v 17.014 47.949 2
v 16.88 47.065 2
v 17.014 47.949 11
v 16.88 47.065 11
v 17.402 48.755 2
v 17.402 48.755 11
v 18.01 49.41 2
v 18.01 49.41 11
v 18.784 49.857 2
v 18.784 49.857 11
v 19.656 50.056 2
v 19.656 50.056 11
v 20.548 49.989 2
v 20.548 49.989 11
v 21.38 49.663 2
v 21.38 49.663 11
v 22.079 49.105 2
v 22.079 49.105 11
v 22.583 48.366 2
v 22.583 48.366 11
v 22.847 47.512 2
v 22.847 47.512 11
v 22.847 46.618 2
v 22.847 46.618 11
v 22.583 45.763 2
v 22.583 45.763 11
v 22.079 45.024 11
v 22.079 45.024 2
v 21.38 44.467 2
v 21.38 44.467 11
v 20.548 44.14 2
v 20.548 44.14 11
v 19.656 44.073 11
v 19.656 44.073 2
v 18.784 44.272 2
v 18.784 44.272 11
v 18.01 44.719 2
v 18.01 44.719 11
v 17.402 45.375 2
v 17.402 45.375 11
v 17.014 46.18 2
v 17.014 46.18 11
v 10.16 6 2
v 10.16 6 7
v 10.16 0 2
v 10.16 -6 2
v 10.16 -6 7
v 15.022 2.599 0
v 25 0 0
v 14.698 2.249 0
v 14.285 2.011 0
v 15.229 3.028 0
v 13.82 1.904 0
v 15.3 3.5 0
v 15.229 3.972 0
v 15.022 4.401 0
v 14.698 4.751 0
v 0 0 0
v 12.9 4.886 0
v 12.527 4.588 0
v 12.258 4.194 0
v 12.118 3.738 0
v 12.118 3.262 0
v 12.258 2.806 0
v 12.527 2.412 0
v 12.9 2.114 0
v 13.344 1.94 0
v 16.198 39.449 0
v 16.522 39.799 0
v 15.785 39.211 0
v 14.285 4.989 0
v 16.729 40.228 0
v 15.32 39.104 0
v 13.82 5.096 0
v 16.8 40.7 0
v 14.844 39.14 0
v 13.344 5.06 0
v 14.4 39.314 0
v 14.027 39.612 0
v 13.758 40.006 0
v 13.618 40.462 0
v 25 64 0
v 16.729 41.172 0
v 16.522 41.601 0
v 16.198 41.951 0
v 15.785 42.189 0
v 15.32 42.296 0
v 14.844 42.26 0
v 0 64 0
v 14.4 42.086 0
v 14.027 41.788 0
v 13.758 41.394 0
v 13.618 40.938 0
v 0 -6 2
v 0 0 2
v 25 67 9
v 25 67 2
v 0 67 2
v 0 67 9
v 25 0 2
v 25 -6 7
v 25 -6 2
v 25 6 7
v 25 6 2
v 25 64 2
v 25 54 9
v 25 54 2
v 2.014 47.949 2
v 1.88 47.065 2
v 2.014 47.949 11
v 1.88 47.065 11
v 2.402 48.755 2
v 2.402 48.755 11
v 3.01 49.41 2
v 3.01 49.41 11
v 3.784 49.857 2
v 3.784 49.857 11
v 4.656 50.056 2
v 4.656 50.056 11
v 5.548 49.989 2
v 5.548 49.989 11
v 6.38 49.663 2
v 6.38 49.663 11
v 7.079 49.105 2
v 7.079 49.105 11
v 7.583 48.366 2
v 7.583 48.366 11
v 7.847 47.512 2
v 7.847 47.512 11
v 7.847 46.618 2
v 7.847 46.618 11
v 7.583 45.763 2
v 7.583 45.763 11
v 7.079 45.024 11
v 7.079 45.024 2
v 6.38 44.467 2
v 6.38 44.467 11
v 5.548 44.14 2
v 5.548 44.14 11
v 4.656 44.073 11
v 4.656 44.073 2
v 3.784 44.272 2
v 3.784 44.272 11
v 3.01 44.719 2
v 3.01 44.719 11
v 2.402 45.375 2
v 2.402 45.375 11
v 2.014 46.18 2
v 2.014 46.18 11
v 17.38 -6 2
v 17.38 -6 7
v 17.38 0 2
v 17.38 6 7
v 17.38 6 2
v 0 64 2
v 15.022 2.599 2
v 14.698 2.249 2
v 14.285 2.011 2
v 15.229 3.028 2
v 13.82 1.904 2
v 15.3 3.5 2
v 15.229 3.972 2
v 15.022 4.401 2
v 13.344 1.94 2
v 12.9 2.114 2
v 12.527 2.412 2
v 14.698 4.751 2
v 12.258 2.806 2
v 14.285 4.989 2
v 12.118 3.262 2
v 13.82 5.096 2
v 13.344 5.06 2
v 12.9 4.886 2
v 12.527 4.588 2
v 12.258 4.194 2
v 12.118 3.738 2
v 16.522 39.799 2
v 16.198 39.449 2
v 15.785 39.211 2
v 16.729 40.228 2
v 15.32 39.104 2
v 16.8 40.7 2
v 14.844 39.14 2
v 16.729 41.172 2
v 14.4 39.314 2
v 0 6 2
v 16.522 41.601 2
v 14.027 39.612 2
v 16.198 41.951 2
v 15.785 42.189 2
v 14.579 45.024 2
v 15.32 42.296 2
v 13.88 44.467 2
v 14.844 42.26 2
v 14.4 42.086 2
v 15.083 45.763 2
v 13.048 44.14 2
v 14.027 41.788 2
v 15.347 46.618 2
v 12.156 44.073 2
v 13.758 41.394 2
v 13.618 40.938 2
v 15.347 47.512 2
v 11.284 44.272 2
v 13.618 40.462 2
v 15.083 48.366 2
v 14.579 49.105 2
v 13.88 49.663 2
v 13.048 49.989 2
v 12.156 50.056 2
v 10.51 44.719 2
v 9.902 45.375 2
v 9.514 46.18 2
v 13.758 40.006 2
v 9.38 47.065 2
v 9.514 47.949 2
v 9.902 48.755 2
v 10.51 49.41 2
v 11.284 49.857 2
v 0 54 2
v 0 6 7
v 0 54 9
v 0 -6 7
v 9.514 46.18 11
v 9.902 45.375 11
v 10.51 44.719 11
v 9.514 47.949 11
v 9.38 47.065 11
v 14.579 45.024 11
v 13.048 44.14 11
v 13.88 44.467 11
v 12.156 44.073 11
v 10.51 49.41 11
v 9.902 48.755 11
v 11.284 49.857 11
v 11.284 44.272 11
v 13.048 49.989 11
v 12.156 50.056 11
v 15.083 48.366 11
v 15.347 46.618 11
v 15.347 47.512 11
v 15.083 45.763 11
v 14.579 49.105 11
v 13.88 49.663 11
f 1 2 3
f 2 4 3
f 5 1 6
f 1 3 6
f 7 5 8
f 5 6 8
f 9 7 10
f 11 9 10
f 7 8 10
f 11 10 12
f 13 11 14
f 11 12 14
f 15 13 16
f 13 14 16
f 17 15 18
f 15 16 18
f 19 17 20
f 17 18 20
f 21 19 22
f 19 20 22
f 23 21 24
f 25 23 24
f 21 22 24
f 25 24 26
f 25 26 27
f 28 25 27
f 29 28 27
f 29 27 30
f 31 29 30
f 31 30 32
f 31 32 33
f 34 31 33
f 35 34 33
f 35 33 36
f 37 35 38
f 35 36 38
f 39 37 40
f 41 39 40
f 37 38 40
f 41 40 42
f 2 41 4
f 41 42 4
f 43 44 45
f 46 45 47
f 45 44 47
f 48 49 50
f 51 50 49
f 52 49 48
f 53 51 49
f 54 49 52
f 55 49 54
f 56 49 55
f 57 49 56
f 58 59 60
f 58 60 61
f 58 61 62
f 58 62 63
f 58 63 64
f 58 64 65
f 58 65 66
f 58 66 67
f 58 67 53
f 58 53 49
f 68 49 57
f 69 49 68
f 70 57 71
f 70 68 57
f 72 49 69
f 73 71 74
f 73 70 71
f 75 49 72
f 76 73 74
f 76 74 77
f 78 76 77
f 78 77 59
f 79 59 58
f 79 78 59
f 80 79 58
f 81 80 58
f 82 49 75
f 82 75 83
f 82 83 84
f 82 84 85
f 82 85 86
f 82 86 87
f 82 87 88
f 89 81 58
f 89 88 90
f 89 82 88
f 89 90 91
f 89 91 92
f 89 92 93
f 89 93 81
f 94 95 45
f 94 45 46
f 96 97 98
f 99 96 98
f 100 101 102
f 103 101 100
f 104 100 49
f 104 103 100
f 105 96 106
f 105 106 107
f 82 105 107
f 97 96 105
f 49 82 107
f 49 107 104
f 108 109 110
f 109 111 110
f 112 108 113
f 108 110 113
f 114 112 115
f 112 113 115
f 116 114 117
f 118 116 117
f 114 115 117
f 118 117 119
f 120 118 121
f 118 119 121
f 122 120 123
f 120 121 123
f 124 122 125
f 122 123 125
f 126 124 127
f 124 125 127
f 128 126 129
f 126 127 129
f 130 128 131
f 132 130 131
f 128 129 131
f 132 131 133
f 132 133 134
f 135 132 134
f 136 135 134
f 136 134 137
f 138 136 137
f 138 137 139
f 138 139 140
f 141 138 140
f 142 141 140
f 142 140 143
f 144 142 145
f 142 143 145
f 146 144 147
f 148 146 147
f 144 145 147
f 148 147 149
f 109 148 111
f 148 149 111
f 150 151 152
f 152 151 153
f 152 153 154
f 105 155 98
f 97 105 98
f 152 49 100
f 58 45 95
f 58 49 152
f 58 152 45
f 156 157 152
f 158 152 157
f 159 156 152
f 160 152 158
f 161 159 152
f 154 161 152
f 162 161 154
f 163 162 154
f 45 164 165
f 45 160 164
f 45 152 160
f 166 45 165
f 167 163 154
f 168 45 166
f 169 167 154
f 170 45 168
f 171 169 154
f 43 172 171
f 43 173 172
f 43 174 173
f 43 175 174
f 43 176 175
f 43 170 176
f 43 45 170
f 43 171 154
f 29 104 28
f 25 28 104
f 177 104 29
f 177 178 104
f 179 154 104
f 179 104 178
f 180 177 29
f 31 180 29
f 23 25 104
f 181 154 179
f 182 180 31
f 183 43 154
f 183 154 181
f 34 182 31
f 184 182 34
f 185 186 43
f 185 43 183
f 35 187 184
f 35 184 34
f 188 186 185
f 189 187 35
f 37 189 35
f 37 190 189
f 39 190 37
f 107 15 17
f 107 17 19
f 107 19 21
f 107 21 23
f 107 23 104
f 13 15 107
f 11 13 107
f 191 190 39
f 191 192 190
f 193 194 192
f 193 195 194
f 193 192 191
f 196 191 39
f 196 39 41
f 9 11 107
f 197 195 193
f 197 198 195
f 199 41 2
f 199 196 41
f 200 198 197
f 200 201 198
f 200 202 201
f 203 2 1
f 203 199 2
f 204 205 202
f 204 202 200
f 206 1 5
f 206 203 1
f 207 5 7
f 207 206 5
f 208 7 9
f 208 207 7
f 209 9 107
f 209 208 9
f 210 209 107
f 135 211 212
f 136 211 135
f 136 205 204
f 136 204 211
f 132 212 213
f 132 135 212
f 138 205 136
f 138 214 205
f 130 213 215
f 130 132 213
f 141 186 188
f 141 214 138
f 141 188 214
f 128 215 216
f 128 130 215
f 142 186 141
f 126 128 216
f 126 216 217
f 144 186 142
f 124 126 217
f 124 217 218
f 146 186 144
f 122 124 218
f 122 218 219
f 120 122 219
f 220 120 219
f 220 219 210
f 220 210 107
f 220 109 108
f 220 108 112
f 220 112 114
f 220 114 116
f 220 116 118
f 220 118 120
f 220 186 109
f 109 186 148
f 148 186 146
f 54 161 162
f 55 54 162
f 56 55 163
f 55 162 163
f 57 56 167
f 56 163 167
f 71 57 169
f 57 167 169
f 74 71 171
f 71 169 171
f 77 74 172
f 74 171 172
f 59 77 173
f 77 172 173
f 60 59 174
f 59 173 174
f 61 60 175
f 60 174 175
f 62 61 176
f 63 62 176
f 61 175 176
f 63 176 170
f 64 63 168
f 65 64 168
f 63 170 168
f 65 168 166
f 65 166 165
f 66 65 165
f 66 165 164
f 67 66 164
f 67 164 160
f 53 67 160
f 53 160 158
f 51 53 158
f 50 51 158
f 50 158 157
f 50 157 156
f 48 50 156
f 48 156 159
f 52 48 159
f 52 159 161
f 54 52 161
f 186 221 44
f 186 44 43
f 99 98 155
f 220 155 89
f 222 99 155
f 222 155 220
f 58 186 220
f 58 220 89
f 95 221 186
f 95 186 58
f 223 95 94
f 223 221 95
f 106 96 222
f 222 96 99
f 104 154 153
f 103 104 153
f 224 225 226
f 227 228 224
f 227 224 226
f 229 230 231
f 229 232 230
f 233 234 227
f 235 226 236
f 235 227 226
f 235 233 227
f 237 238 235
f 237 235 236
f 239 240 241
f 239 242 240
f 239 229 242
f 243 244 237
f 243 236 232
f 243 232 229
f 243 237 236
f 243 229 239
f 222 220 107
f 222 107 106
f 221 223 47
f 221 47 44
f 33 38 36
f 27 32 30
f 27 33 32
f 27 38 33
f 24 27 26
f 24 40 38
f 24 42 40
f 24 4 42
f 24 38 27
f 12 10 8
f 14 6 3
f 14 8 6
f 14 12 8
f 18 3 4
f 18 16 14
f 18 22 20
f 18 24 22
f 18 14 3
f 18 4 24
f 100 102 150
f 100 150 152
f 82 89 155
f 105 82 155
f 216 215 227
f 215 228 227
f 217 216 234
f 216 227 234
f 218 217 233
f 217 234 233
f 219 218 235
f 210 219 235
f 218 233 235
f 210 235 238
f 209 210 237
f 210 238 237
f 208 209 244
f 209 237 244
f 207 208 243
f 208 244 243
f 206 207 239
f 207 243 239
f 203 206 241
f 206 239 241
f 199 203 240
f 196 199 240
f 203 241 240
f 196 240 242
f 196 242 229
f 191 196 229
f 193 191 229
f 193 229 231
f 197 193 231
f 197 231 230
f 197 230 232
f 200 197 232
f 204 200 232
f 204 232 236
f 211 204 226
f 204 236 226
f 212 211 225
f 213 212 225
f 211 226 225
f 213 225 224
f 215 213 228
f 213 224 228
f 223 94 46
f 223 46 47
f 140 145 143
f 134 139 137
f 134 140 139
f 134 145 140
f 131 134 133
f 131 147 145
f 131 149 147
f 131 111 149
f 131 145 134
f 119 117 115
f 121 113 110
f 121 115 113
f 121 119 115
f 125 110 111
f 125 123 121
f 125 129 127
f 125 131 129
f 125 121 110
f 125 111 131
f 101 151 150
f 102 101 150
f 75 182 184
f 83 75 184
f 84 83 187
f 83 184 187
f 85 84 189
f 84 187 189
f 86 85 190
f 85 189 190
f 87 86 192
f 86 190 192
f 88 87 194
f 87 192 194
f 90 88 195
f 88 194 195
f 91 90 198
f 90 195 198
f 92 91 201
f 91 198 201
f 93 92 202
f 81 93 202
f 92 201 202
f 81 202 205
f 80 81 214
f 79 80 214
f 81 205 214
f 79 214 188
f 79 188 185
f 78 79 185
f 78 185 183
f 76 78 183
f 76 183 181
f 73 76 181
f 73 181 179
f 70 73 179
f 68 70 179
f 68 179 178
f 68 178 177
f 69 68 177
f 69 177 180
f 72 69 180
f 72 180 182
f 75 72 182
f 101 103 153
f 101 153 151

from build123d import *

# Parameters (mm, degrees)
SKETCH1_W                      = 25
SKETCH1_H                      = 67
BOSS_EXTRUDE1_DEPTH            = 9
SKETCH2_W                      = 2
SKETCH2_H                      = 3
CUT_EXTRUDE1_DEPTH             = 73.076348409
SKETCH3_W                      = 7
SKETCH3_H                      = 54
CUT_EXTRUDE2_DEPTH             = 73.076348409
BOSS_EXTRUDE2_DEPTH            = 10.16
BOSS_EXTRUDE3_DEPTH            = 7.62
SKETCH6_W                      = 3
SKETCH6_H                      = 9
SKETCH7_W                      = 3
SKETCH7_H                      = 9
SKETCH8_W                      = 3
SKETCH8_H                      = 9
F_3_2_3_2_DIAMETER_HOLE1_D     = 3.2
F_3_2_3_2_DIAMETER_HOLE1_DEPTH = 11


with BuildPart() as part:
    # Sketch1 → Boss-Extrude1 (new body)
    with BuildSketch(Plane(origin=(0, 0, 0), x_dir=(-1, 0, 0), z_dir=(0, 0, -1))):
        with Locations((-12.5, 33.5)):
            Rectangle(SKETCH1_W, SKETCH1_H)
    extrude(amount=-BOSS_EXTRUDE1_DEPTH)

    # Sketch2 → Cut-Extrude1 (cut, through all)
    with BuildSketch(Plane.ZY):
        with Locations((1, 65.5)):
            Rectangle(SKETCH2_W, SKETCH2_H)
    extrude(amount=-CUT_EXTRUDE1_DEPTH, mode=Mode.SUBTRACT)

    # Sketch3 → Cut-Extrude2 (cut, through all)
    with BuildSketch(Plane.ZY):
        with Locations((5.5, 27)):
            Rectangle(SKETCH3_W, SKETCH3_H)
    extrude(amount=-CUT_EXTRUDE2_DEPTH, mode=Mode.SUBTRACT)

    # Sketch4 → Boss-Extrude2 (add)
    with BuildSketch(Plane(origin=(0, 0, 0), x_dir=(0, -1, 0), z_dir=(-1, 0, 0))):
        Polygon((-6, 2), (0, 2), (6, 2), (6, 7), (-6, 7), align=None)
    extrude(amount=-BOSS_EXTRUDE2_DEPTH)

    # Sketch5 → Boss-Extrude3 (add)
    with BuildSketch(Plane(origin=(25, 0, 0), x_dir=(0, 0, -1), z_dir=(1, 0, 0))):
        Polygon((-2, 0), (-2, 6), (-7, 6), (-7, -6), (-2, -6), align=None)
    extrude(amount=-BOSS_EXTRUDE3_DEPTH)

    # Sketch6 → Revolve1 (revolve)
    with BuildSketch(Plane.XZ.offset(-47.064665705), mode=Mode.PRIVATE) as revolve1_sk:
        with Locations((21.380279303, 6.5)):
            Rectangle(SKETCH6_W, SKETCH6_H)
    revolve(revolve1_sk.sketch.rotate(Axis((19.880279303, 47.064665705, 11), (0, 0, -1)), 180), axis=Axis((19.880279303, 47.064665705, 11), (0, 0, -1)))

    # Sketch7 → Revolve2 (revolve)
    with BuildSketch(Plane.XZ.offset(-47.064665705), mode=Mode.PRIVATE) as revolve2_sk:
        with Locations((13.880279303, 6.5)):
            Rectangle(SKETCH7_W, SKETCH7_H)
    revolve(revolve2_sk.sketch.rotate(Axis((12.380279303, 47.064665705, 11), (0, 0, -1)), 180), axis=Axis((12.380279303, 47.064665705, 11), (0, 0, -1)))

    # Sketch8 → Revolve3 (revolve)
    with BuildSketch(Plane.XZ.offset(-47.064665705), mode=Mode.PRIVATE) as revolve3_sk:
        with Locations((6.380279303, 6.5)):
            Rectangle(SKETCH8_W, SKETCH8_H)
    revolve(revolve3_sk.sketch.rotate(Axis((4.880279303, 47.064665705, 11), (0, 0, -1)), 180), axis=Axis((4.880279303, 47.064665705, 11), (0, 0, -1)))

    # Ø3.2 (3.2) Diameter Hole1
    with Locations(Plane(origin=(0, 0, 0), x_dir=(-1, 0, 0), z_dir=(0, 0, -1))):
        with Locations((-15.2, 40.7), (-13.7, 3.5)):
            Hole(F_3_2_3_2_DIAMETER_HOLE1_D / 2, depth=F_3_2_3_2_DIAMETER_HOLE1_DEPTH)


solid = part.part
